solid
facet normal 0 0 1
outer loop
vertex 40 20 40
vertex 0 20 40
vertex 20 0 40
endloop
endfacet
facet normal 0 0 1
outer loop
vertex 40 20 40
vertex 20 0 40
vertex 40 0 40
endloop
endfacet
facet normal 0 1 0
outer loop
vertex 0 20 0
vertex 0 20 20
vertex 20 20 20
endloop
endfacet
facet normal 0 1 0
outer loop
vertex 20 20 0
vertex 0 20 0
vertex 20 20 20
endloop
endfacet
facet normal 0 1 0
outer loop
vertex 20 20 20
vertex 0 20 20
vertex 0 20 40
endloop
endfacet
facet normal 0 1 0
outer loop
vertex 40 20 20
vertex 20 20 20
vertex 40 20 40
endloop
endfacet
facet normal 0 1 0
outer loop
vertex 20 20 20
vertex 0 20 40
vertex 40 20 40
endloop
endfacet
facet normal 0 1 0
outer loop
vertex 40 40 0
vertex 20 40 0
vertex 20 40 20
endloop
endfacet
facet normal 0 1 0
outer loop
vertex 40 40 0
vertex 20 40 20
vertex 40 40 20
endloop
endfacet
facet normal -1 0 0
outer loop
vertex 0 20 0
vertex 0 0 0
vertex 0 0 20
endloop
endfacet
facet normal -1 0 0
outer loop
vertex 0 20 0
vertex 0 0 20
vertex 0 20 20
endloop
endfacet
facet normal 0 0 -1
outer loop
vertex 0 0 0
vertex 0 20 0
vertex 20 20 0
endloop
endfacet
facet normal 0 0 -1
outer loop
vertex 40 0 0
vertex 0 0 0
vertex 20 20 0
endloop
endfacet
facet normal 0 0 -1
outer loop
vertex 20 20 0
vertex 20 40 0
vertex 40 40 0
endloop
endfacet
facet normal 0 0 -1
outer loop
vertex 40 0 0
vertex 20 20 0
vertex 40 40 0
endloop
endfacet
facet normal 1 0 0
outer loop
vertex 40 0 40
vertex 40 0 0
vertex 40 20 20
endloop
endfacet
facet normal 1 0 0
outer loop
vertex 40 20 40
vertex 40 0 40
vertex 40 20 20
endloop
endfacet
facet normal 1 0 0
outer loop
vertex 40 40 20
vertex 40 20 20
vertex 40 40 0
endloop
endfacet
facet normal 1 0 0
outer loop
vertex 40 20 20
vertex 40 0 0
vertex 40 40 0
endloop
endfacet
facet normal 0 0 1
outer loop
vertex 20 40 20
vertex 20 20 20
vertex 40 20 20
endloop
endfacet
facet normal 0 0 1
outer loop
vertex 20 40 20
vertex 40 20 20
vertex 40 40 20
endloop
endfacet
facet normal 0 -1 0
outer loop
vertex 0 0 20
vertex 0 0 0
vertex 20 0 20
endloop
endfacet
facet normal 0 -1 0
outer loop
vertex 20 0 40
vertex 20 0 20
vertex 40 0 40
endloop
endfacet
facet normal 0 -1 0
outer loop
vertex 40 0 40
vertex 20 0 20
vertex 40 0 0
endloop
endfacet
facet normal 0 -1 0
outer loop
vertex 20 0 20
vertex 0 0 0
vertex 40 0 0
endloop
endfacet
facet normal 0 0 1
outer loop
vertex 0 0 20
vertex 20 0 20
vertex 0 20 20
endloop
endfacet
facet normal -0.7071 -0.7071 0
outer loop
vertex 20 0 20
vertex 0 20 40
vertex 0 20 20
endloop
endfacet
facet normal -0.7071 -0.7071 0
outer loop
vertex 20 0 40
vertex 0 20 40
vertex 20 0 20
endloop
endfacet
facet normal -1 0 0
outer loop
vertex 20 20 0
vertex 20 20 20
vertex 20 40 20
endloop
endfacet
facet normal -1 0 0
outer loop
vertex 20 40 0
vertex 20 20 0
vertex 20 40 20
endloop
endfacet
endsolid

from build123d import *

# Parameters (mm, degrees)
SKETCH1_W           = 40
SKETCH1_H           = 40
BOSS_EXTRUDE1_DEPTH = 40
SKETCH2_W           = 20
SKETCH2_H           = 20
CUT_EXTRUDE1_DEPTH  = 40
SKETCH3_W           = 20
SKETCH3_H           = 20
CUT_EXTRUDE2_DEPTH  = 40
CUT_EXTRUDE3_DEPTH  = 20


with BuildPart() as part:
    # Sketch1 → Boss-Extrude1 (new body)
    with BuildSketch(Plane.XY):
        with Locations((20, 20)):
            Rectangle(SKETCH1_W, SKETCH1_H)
    extrude(amount=BOSS_EXTRUDE1_DEPTH)

    # Sketch2 → Cut-Extrude1 (cut)
    with BuildSketch(Plane.XY.offset(40)):
        with Locations((10, 30)):
            Rectangle(SKETCH2_W, SKETCH2_H)
    extrude(amount=-CUT_EXTRUDE1_DEPTH, mode=Mode.SUBTRACT)

    # Sketch3 → Cut-Extrude2 (cut)
    with BuildSketch(Plane.ZY.offset(-20)):
        with Locations((30, 30)):
            Rectangle(SKETCH3_W, SKETCH3_H)
    extrude(amount=-CUT_EXTRUDE2_DEPTH, mode=Mode.SUBTRACT)

    # Sketch4 → Cut-Extrude3 (cut)
    with BuildSketch(Plane.XY.offset(40)):
        Polygon((0, 20), (20, 0), (0, 0), align=None)
    extrude(amount=-CUT_EXTRUDE3_DEPTH, mode=Mode.SUBTRACT)


solid = part.part
